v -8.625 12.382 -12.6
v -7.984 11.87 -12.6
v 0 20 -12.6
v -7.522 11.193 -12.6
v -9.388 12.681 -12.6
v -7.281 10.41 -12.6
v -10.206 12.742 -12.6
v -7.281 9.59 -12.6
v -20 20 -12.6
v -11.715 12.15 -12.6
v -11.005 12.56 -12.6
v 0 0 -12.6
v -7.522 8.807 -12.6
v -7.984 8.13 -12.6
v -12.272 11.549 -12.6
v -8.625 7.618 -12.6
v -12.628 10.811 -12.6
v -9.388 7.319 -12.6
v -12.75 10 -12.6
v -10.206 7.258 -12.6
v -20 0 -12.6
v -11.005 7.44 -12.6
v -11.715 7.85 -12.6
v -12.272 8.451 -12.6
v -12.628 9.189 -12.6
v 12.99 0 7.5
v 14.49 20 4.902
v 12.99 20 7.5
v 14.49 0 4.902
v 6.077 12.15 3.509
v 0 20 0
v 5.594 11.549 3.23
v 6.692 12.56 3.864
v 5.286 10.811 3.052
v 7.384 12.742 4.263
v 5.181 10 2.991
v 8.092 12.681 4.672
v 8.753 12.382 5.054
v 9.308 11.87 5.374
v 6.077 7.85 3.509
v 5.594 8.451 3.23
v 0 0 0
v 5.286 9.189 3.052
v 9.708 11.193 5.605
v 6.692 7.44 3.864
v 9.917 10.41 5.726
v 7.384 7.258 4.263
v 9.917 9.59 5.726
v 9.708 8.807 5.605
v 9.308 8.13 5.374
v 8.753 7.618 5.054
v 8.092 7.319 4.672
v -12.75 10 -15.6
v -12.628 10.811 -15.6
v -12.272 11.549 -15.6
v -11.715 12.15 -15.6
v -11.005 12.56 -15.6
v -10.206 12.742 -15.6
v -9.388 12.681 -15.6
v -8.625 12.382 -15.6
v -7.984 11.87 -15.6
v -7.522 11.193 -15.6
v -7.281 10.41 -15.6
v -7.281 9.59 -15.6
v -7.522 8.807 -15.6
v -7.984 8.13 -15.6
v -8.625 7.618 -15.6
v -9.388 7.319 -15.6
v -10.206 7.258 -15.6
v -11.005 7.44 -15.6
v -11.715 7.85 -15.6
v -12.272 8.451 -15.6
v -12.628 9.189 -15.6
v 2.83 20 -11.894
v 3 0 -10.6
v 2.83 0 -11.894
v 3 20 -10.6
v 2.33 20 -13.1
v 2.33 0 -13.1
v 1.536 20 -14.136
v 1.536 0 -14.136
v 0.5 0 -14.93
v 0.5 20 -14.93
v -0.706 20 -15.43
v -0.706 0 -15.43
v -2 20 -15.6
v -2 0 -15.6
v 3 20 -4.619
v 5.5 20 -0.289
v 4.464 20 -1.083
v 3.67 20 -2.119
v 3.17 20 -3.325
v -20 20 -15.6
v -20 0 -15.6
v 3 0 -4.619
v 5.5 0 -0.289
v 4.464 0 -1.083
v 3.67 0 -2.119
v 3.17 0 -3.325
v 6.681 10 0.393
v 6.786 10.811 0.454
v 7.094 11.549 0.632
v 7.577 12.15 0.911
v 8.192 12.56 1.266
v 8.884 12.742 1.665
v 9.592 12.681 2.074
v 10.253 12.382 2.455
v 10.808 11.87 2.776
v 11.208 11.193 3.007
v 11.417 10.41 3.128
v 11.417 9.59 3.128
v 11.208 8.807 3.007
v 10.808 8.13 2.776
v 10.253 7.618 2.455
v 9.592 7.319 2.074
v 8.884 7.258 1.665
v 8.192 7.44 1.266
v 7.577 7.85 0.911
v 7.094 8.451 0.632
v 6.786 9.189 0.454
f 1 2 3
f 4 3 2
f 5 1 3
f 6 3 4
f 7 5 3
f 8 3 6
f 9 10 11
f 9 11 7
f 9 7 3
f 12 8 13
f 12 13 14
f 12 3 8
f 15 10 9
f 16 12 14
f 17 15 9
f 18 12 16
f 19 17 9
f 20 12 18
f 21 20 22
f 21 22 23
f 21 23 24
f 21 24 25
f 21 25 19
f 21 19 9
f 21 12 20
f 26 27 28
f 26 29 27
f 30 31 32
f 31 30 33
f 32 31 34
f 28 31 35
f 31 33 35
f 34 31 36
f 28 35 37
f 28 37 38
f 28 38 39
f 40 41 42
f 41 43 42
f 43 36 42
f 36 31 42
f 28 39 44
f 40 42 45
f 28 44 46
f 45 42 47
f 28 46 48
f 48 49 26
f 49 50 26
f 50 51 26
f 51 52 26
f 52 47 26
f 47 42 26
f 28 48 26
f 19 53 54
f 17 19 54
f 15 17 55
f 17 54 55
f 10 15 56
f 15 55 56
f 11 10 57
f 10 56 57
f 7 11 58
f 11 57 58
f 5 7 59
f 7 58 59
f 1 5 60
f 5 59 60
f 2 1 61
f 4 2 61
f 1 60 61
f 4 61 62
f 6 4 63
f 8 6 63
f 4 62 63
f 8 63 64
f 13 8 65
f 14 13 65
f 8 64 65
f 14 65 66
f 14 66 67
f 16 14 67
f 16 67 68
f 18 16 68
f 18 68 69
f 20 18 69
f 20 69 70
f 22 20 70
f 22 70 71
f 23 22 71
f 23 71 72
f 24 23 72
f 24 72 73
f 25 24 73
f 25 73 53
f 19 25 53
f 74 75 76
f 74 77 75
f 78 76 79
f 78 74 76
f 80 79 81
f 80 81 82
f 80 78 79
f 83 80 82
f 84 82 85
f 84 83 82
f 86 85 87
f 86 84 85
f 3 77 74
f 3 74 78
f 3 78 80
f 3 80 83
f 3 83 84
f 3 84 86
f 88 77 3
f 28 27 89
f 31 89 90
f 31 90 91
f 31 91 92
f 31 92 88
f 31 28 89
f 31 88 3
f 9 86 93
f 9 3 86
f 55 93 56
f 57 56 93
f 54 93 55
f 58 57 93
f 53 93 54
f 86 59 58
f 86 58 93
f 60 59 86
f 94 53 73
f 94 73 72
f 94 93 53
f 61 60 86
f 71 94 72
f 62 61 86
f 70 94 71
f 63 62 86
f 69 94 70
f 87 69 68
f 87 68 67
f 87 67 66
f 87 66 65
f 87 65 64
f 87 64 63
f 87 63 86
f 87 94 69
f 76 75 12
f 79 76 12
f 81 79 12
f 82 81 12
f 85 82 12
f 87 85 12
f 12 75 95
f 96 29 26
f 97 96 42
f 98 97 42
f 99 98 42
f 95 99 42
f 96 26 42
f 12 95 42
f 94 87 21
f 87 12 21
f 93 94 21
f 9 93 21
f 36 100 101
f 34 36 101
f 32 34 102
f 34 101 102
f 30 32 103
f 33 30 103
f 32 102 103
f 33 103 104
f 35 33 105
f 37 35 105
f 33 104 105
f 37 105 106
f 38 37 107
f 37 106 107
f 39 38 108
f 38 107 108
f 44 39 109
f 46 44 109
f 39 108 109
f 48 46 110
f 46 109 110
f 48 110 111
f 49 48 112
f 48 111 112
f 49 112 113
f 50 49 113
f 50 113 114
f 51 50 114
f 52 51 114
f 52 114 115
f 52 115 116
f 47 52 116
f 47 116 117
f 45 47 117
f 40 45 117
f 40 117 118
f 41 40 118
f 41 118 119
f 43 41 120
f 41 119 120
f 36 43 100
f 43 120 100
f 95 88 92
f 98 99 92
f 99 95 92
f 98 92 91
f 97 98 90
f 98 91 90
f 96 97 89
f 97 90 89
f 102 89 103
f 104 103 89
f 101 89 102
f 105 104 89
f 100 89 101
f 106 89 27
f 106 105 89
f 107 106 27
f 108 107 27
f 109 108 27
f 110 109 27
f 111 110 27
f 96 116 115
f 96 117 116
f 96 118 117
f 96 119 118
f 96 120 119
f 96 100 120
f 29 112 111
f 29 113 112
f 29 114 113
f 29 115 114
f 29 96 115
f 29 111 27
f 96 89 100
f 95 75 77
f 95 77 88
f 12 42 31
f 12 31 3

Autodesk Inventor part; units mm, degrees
ref_plane "YZ Plane" through (0, 0, 0) normal (1, 0, 0) x (0, 1, 0)
ref_plane "XZ Plane" through (0, 0, 0) normal (0, 1, 0) x (-1, 0, 0)
ref_plane "XY Plane" through (0, 0, 0) normal (0, 0, 1) x (1, 0, 0)
sketch "Sketch4" plane through (0, 0, 0) normal (0, 1, 0) x (-1, 0, 0)
  line L0 (0, 0) -> (0, -12.6)
  line L1 (0, -12.6) -> (20, -12.6)
  line L2 (20, -12.6) -> (0, -12.6)
  line L3 (0, -12.6) -> (0, -15.6)
  line L4 (0, -15.6) -> (20, -15.6)
  line L5 (20, -15.6) -> (20, -12.6)
  line L6 (0, 0) -> (-12.9904, 7.5)
  line L7 (0, 0) -> (15, 0) construction
  line L8 (-12.9904, 7.5) -> (0, 0)
  line L9 (0, 0) -> (-1.5, -2.5981)
  line L10 (-1.5, -2.5981) -> (-14.4904, 4.9019)
  line L11 (-14.4904, 4.9019) -> (-12.9904, 7.5)
  line L12 (0, 0) -> (0, -15.6)
  line L13 (0, -15.6) -> (-3, -15.6)
  line L14 (-3, -15.6) -> (-3, 0)
  line L15 (-3, 0) -> (0, 0)
  dimension "d16" = 12.6
  dimension "d17" = 20
  dimension "d18" = 3
  dimension "d19" = 15
  dimension "d20" = 150
  dimension "d21" = 3
  dimension "d24" = 3
extrude "Extrusion5" add sketch "Sketch4" along normal blind 20
sketch "Sketch5" plane through (3, 0, -15.6) normal (0, 0, -1) x (-1, 0, 0)
  line L0 (3, 0) -> (23, 0) projected
  line L1 (13, 0) -> (13, 10)
  circle A0 centre (13, 10) radius 2.75
  dimension "d27" = 10
  dimension "d28" = 5.5
extrude "Extrusion6" cut sketch "Sketch5" against normal blind 3
sketch "Sketch6" plane through (3, 0, -1.7321) normal (0.5, 0, -0.866) x (-0.866, 0, -0.5)
  line L0 (0, 0) -> (0, 20) projected
  line L1 (0, 10) -> (-7, 10)
  circle A0 centre (-7, 10) radius 2.75
  point P0 (1.7321, 0)
  dimension "d31" = 7
  dimension "d32" = 5.5
extrude "Extrusion7" cut sketch "Sketch6" against normal blind 3
fillet "Fillet1" radius 5 2 edges at (3, 10, -1.7321) (3, 10, -15.6)
properties part number "Acrylic_angle_bracket"
